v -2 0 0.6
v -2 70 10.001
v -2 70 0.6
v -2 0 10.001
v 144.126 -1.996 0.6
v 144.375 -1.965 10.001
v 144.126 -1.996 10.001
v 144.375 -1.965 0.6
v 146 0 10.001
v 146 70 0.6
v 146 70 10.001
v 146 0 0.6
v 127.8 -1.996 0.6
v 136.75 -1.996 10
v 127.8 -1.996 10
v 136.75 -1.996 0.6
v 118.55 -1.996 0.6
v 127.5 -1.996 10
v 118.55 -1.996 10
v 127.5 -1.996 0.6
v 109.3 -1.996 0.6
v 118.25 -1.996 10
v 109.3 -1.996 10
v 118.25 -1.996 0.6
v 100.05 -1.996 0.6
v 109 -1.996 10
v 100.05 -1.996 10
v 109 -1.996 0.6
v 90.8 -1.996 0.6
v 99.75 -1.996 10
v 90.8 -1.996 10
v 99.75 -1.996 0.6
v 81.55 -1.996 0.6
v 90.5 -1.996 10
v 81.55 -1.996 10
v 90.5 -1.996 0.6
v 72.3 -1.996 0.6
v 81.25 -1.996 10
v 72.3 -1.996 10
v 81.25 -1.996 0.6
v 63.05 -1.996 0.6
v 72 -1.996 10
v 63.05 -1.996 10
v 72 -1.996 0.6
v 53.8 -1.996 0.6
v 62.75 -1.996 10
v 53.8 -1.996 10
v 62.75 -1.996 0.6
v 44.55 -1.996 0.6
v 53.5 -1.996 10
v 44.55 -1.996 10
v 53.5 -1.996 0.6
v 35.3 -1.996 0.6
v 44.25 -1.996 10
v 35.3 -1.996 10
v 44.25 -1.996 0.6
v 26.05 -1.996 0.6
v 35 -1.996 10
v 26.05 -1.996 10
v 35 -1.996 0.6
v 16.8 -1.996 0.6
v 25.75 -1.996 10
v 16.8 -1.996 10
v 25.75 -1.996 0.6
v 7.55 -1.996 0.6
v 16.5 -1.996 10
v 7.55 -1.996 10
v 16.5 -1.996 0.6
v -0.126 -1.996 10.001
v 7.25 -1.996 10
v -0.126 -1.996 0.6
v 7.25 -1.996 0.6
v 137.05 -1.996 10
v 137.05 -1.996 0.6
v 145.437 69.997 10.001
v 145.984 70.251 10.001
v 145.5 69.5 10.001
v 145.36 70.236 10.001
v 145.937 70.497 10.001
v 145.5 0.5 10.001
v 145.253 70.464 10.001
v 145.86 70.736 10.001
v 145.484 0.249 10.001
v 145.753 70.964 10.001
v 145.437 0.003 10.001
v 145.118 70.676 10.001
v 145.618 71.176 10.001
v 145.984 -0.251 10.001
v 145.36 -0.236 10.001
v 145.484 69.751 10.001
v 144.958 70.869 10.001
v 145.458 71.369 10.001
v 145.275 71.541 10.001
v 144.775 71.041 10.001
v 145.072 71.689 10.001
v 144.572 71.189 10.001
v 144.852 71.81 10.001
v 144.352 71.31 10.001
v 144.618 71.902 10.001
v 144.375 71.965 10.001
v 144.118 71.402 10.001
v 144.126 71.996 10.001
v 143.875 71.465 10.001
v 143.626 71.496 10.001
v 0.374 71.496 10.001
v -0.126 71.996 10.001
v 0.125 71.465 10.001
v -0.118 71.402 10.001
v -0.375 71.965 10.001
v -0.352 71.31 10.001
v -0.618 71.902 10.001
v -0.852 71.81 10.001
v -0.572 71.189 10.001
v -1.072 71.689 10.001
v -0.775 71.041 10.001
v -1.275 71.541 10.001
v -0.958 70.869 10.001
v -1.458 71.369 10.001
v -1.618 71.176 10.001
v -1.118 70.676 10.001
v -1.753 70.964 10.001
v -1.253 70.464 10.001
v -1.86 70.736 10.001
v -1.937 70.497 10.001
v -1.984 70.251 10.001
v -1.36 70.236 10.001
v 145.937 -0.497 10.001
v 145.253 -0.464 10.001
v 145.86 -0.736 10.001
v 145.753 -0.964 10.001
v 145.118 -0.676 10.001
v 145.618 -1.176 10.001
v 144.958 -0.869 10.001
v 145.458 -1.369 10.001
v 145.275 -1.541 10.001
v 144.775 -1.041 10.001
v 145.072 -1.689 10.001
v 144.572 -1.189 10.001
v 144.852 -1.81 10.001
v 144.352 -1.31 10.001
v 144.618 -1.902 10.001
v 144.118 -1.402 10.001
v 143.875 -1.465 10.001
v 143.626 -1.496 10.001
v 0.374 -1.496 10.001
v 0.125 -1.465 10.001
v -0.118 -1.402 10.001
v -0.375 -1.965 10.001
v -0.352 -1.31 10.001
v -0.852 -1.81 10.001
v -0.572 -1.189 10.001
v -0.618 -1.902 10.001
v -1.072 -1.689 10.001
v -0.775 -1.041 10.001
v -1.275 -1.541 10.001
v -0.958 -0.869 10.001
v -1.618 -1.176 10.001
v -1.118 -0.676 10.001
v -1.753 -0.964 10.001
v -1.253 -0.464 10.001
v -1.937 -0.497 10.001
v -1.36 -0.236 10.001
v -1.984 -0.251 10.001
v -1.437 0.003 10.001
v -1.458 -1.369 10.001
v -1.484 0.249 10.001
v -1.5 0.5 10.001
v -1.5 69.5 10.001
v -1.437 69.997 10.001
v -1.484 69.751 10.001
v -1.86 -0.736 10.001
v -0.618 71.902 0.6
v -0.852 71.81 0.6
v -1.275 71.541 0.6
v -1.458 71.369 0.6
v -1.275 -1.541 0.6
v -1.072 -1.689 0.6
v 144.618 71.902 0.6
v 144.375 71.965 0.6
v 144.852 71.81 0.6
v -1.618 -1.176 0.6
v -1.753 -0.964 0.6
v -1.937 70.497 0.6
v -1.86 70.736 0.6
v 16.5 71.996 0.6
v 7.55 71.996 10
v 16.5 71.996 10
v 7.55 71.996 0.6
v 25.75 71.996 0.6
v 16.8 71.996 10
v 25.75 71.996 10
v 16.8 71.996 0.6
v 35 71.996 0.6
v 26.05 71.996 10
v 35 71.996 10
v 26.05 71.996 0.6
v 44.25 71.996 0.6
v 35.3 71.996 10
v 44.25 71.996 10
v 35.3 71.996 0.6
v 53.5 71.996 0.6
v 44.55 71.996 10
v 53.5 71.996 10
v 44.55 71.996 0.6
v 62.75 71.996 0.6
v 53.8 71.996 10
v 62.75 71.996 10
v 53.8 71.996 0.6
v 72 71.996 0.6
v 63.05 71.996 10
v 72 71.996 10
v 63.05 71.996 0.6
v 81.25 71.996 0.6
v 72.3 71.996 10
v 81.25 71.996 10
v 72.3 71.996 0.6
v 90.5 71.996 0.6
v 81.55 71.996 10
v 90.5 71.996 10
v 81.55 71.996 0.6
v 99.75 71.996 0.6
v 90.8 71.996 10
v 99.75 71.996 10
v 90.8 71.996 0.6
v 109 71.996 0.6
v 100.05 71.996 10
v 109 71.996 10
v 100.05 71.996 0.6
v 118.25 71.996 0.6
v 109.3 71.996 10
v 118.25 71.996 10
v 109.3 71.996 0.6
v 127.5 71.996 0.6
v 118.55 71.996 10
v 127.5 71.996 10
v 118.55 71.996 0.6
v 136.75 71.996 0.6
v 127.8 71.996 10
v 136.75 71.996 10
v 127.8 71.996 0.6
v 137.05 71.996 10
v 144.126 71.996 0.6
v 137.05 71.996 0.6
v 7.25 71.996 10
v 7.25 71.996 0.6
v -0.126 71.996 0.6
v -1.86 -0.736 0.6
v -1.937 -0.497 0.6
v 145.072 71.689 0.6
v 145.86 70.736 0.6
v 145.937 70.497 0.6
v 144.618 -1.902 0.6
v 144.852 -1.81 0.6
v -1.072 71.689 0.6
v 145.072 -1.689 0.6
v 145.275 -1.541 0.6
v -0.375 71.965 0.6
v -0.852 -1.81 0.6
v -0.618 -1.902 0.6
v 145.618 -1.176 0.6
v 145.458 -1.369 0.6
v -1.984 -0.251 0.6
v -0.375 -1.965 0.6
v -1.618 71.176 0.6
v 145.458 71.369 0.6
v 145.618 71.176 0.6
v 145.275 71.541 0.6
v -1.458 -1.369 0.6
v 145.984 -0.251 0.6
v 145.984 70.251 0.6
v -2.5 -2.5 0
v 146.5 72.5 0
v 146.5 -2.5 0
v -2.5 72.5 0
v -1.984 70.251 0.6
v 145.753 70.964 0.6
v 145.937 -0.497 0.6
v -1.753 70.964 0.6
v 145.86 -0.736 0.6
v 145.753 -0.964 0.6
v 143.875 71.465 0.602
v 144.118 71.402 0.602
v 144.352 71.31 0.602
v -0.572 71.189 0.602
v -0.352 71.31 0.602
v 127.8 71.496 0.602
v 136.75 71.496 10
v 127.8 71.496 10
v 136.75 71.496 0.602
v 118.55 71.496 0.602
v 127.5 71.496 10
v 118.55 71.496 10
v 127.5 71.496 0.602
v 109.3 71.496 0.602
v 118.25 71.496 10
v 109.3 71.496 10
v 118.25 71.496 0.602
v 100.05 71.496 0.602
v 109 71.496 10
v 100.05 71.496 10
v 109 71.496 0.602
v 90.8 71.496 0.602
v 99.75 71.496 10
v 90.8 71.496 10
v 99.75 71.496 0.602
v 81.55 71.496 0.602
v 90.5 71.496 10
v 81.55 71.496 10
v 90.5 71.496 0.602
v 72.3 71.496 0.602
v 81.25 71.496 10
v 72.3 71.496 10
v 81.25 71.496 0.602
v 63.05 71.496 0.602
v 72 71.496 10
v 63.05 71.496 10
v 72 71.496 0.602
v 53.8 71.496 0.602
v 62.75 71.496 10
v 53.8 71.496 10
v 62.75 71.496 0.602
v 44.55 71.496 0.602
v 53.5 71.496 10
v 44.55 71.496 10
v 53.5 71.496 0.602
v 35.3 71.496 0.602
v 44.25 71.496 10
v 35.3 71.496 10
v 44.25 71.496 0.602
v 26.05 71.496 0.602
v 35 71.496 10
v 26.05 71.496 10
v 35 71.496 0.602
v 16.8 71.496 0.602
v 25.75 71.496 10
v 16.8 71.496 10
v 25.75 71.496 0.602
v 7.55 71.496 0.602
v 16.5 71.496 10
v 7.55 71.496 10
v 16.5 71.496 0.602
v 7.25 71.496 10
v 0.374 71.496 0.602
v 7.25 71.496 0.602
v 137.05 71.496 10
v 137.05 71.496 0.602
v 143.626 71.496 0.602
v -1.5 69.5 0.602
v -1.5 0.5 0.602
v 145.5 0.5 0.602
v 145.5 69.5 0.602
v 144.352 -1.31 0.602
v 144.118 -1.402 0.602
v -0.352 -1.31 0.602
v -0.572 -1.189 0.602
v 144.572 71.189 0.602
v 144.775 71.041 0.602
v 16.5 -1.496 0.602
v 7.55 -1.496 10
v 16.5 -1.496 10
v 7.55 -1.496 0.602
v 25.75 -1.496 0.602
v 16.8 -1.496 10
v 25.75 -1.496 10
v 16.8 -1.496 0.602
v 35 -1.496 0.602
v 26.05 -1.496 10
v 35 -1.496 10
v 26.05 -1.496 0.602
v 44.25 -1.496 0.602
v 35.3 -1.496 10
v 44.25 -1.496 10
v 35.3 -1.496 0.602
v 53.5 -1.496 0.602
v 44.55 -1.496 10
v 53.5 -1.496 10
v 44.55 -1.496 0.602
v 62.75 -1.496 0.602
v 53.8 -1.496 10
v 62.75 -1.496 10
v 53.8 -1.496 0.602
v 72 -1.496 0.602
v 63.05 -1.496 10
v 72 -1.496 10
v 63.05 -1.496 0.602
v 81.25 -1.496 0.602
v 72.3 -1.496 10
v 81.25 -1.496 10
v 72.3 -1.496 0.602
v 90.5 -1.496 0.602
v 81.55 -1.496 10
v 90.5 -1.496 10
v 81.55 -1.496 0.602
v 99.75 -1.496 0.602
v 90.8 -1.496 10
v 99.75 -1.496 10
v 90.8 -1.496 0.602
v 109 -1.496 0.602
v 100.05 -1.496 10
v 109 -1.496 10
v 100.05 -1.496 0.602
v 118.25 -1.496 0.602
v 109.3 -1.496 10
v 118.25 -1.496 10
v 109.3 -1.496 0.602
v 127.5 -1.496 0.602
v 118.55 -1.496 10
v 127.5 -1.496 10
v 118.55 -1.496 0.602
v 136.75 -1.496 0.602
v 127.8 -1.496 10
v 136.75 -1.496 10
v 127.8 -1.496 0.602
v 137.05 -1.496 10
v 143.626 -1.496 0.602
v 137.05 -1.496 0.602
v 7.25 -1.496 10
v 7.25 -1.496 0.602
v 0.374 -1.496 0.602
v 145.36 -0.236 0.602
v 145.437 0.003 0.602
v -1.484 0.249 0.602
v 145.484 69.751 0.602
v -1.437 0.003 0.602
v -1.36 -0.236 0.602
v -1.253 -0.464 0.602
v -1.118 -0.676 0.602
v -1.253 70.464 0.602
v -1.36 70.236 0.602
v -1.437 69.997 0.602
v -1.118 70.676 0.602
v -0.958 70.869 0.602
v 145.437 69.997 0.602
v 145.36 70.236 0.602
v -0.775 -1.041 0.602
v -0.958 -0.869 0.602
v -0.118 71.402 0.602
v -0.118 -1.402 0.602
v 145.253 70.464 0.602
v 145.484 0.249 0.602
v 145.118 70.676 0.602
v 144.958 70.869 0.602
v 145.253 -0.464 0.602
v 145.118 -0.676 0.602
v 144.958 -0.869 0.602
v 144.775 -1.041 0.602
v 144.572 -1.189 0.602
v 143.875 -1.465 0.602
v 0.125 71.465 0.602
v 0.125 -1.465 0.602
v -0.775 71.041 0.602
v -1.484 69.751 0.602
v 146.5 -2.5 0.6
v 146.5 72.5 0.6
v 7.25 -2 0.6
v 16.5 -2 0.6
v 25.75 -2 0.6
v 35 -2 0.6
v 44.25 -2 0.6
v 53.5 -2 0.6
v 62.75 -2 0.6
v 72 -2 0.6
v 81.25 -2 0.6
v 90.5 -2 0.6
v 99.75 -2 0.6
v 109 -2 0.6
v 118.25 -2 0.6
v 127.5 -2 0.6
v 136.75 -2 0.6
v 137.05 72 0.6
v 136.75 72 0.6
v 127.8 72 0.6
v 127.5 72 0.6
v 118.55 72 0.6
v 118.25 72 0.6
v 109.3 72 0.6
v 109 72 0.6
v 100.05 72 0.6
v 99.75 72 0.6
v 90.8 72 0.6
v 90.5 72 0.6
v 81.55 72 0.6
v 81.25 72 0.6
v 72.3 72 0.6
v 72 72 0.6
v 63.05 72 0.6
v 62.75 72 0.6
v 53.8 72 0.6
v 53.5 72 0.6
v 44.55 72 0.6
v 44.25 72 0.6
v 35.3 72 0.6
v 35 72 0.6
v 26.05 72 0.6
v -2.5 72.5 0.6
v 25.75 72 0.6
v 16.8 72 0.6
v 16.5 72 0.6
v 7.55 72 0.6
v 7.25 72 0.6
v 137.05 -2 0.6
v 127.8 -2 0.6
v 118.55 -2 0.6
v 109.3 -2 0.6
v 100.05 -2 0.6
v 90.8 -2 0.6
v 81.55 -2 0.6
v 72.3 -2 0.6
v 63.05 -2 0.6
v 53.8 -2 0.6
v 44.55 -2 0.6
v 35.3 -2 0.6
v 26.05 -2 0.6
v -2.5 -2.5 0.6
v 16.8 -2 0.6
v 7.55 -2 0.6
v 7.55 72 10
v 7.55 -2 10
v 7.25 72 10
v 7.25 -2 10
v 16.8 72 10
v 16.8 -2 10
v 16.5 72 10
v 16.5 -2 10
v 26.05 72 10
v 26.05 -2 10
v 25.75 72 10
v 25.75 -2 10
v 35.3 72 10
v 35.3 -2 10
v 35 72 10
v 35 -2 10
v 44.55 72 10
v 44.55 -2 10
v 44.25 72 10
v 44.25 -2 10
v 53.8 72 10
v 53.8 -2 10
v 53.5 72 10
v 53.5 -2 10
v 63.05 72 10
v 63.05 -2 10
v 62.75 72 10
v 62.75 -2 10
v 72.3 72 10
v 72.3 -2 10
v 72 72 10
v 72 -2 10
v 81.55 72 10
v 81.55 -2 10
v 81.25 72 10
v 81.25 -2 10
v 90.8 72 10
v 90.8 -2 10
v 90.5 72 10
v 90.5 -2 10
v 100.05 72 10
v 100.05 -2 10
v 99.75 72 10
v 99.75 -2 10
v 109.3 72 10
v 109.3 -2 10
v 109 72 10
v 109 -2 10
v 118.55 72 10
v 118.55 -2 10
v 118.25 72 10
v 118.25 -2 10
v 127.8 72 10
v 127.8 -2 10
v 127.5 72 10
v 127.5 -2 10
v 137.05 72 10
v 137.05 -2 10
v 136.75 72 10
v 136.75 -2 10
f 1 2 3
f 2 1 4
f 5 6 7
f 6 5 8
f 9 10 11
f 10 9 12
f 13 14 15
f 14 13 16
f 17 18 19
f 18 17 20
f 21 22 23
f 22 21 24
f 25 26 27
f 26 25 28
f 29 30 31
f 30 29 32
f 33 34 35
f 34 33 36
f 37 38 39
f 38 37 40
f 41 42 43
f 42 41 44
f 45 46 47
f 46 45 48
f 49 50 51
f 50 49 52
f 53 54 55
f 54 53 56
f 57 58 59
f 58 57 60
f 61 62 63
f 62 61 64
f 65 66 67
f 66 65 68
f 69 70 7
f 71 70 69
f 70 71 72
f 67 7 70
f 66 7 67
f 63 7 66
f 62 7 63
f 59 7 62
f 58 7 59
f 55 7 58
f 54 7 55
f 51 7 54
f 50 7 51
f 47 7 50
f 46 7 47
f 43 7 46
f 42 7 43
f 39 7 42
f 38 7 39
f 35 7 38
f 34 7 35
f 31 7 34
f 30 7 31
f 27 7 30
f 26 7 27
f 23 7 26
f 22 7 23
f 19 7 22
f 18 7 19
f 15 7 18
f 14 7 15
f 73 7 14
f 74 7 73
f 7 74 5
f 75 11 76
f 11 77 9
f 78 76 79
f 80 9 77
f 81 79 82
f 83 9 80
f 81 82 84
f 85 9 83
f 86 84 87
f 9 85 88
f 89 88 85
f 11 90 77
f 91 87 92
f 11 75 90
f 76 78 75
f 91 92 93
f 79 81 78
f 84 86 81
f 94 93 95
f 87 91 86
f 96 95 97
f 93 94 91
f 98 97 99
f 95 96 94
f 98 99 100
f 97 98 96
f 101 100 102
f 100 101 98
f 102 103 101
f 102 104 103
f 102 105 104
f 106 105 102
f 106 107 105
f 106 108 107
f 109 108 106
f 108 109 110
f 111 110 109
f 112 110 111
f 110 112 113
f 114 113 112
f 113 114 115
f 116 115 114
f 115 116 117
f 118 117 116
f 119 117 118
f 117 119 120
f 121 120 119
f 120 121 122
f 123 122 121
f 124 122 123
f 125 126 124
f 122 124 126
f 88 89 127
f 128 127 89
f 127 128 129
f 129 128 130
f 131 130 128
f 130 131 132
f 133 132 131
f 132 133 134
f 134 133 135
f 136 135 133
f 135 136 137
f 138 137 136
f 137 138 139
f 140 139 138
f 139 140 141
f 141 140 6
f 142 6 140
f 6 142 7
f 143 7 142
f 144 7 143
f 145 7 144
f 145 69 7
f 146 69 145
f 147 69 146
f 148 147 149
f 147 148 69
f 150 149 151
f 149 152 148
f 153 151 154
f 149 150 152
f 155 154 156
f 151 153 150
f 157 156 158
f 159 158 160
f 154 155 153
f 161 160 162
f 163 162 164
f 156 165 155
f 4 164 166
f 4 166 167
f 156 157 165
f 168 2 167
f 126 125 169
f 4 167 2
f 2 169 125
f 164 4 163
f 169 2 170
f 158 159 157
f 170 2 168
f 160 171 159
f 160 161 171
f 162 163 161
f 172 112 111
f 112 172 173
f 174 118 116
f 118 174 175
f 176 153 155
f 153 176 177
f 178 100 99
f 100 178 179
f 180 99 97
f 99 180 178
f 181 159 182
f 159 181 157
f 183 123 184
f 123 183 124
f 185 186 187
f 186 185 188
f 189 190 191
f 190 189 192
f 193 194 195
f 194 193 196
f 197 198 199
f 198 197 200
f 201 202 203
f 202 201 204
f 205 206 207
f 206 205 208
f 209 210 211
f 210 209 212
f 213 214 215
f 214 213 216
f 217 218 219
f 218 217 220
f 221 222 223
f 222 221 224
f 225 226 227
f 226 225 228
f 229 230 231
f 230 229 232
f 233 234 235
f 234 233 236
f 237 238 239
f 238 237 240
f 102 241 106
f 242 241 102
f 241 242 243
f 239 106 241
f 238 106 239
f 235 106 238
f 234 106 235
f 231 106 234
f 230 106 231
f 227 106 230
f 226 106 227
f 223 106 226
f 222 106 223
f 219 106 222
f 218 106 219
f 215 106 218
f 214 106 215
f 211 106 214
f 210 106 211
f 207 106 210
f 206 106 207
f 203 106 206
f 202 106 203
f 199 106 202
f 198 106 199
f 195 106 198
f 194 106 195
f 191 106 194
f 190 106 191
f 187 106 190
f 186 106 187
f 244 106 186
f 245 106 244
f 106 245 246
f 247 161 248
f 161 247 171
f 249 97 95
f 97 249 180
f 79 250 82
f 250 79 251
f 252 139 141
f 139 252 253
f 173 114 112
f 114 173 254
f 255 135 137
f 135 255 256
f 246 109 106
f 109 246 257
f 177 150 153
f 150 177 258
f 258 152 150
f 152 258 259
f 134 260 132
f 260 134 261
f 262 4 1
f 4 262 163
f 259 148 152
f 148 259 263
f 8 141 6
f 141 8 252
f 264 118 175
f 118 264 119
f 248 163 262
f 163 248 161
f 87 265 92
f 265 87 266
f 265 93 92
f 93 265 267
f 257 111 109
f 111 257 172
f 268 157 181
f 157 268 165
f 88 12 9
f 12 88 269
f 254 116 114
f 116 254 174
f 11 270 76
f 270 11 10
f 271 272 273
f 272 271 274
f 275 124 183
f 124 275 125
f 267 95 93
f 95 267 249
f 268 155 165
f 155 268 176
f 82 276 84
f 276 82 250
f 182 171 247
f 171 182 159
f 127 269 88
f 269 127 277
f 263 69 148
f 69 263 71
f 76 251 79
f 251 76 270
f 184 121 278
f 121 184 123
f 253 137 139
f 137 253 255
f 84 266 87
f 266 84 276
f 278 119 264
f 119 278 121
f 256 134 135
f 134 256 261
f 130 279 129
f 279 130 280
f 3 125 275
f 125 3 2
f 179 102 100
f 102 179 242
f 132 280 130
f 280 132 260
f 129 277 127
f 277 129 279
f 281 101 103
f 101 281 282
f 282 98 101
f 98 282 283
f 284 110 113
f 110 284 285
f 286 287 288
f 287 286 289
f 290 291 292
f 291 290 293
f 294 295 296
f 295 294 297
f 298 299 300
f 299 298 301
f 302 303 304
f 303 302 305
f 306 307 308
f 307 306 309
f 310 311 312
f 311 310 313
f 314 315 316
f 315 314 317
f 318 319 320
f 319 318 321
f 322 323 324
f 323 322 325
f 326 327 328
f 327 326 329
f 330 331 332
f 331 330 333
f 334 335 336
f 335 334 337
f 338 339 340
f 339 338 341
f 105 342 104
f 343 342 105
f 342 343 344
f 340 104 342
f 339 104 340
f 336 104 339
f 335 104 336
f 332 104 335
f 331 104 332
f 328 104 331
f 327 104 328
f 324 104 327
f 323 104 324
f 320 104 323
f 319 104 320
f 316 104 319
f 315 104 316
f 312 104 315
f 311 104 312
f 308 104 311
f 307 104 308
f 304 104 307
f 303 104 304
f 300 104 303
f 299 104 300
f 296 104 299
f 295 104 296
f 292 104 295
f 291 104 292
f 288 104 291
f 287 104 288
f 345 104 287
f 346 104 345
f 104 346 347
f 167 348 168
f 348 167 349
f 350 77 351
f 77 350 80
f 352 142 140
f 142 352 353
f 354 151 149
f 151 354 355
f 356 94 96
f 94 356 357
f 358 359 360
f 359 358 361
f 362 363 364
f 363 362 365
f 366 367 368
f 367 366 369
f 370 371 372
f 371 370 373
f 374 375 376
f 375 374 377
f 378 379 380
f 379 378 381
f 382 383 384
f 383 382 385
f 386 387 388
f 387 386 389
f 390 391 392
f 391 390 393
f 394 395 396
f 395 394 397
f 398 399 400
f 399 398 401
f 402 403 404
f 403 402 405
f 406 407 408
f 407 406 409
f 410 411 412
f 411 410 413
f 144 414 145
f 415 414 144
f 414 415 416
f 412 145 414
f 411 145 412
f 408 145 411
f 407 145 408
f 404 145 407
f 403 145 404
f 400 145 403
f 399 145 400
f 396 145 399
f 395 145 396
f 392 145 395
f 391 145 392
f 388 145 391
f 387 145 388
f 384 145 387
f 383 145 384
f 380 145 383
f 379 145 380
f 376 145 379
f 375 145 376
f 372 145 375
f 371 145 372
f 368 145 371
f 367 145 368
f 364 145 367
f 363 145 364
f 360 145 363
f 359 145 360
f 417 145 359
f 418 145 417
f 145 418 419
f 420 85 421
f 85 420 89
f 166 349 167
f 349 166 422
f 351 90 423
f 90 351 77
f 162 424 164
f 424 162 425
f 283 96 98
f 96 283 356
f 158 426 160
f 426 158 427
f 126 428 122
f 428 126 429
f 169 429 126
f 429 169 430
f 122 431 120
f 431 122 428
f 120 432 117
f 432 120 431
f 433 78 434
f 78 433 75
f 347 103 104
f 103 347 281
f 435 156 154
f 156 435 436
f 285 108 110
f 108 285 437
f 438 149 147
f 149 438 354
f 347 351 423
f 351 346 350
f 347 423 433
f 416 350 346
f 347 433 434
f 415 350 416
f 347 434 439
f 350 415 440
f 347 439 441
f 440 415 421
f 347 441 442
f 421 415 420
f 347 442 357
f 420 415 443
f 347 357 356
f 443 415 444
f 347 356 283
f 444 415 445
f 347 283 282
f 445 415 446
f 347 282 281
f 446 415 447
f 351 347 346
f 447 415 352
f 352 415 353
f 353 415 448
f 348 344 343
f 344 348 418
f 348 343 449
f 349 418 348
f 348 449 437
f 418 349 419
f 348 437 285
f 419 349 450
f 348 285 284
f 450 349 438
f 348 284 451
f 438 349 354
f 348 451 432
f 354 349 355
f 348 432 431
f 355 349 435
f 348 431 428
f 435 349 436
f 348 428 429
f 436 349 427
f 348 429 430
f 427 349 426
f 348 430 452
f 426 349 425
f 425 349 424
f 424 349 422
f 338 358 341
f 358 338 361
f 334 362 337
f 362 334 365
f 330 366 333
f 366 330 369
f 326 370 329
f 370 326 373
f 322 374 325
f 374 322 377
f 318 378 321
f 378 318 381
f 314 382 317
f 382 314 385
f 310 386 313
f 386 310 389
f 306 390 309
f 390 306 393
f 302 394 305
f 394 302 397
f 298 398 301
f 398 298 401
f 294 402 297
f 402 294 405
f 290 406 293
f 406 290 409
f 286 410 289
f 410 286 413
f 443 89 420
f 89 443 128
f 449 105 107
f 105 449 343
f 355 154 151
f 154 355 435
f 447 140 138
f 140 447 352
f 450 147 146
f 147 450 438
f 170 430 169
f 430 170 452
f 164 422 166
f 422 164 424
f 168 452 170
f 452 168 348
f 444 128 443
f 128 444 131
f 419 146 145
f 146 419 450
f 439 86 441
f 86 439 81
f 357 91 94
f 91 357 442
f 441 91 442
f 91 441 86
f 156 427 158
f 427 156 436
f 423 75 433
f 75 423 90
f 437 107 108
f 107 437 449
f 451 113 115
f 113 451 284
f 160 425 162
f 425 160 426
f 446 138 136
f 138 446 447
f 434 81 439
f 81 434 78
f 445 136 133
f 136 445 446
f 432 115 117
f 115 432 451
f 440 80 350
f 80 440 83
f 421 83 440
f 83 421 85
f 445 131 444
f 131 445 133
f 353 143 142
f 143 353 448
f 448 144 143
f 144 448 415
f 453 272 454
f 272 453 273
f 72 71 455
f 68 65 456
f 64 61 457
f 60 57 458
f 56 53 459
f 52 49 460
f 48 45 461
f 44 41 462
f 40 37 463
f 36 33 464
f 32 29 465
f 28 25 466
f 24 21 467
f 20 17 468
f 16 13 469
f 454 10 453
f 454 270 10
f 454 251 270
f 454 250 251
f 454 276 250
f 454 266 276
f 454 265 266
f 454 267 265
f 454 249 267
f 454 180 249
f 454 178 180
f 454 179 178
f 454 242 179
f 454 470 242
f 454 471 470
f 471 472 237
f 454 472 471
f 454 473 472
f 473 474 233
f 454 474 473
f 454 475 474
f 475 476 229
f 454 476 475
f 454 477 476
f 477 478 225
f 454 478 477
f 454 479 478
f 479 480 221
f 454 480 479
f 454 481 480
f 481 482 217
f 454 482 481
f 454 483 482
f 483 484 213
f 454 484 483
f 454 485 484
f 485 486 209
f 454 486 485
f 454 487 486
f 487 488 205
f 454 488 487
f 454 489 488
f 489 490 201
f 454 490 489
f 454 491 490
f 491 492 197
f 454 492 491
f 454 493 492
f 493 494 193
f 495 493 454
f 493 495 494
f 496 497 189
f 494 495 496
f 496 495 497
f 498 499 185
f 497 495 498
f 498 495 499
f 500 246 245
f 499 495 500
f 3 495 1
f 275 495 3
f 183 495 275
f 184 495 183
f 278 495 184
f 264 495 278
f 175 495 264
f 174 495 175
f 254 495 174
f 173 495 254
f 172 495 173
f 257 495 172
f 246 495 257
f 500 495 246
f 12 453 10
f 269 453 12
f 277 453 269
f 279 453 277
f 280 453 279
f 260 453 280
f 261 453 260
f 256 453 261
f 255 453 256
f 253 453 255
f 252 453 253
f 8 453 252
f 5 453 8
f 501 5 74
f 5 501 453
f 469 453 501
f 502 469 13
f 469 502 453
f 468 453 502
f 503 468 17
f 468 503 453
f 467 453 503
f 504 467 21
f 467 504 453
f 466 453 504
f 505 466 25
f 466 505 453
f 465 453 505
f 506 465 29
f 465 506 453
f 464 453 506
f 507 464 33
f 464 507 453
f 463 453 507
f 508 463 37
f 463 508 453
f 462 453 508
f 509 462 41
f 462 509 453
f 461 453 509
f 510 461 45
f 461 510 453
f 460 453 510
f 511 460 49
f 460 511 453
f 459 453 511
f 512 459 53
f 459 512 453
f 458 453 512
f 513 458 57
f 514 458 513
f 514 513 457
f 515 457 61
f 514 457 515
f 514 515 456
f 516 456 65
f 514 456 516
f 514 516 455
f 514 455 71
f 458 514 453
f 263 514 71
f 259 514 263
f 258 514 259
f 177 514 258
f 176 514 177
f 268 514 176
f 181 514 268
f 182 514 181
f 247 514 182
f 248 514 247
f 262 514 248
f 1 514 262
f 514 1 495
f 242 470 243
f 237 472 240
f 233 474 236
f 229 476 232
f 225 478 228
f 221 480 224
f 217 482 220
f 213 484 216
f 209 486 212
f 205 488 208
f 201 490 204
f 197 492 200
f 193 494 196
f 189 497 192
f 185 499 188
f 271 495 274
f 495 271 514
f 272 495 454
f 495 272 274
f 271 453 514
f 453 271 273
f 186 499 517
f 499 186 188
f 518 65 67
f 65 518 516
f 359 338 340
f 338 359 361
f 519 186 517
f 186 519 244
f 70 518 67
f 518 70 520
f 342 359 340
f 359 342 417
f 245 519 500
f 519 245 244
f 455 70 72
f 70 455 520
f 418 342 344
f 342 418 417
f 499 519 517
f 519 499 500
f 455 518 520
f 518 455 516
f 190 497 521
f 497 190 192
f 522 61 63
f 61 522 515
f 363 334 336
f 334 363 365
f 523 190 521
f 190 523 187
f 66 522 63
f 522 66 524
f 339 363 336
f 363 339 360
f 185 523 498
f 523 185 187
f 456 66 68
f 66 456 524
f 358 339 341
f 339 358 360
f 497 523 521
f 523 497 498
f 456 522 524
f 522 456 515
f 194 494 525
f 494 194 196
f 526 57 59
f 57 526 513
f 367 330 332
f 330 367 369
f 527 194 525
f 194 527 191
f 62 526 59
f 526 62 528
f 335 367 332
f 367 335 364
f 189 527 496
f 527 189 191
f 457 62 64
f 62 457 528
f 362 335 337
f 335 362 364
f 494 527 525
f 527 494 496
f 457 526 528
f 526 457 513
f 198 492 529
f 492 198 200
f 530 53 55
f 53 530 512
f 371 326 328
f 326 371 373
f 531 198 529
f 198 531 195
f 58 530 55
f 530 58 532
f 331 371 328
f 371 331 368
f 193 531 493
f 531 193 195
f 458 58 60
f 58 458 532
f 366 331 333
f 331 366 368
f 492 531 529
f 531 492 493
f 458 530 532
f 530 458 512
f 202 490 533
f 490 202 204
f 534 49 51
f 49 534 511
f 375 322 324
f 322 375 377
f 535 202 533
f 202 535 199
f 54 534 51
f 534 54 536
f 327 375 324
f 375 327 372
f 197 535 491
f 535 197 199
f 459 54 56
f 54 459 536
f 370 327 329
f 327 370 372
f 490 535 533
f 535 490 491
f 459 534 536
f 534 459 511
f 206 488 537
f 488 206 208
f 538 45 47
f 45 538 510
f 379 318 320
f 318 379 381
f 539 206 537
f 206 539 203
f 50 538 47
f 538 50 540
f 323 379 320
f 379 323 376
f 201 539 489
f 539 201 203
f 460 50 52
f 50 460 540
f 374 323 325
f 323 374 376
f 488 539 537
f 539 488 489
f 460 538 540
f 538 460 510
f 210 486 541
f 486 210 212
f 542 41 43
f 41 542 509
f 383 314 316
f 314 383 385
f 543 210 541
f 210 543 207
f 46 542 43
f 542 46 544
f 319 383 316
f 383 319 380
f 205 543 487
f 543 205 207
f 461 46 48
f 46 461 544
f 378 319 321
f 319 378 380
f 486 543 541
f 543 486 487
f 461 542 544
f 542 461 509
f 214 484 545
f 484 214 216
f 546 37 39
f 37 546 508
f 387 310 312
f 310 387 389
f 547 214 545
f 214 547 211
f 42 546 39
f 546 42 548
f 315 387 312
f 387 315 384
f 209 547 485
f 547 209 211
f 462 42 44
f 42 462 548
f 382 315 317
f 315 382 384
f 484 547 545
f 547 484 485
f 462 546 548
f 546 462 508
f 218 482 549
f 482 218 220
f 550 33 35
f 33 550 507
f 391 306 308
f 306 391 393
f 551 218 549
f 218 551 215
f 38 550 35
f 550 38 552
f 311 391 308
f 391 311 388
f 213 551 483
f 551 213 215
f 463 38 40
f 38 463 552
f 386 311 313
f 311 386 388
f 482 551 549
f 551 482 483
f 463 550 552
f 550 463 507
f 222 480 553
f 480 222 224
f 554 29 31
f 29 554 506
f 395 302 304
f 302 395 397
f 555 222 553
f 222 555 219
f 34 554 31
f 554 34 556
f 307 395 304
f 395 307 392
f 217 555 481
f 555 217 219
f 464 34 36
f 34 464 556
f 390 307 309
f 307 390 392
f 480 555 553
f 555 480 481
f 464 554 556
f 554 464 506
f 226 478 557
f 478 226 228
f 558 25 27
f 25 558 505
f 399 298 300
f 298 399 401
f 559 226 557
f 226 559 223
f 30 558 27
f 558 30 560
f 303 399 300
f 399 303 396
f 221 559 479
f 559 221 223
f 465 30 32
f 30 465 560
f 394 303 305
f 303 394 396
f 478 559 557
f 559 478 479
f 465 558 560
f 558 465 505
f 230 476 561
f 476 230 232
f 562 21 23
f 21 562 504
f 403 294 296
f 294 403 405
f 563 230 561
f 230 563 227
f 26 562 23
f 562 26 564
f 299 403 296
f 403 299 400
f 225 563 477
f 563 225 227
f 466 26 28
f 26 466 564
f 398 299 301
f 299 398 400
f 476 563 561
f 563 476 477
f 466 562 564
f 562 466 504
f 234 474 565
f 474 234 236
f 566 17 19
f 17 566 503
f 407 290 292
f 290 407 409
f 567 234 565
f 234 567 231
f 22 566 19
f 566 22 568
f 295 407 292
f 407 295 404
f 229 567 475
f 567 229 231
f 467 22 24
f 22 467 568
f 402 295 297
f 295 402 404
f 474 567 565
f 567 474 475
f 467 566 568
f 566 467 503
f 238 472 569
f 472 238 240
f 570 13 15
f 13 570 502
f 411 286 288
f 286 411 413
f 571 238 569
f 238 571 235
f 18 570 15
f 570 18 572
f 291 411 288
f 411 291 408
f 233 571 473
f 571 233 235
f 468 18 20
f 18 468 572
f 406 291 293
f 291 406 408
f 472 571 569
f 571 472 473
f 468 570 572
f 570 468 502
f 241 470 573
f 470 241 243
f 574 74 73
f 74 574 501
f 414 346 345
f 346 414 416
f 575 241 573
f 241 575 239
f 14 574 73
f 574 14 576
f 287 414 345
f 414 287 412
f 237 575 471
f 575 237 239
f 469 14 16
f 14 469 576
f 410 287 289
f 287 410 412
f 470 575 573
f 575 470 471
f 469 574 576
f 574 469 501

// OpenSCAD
makelid=false;
makebox=true;

$fn=50;
kw=8;
wmul=16;
l=70; //length
h=10; //height
wt=1;//wall thickness
iwt=0.6;//0.8 before and .4 before that;//inner wall thickness
cr=2; //  corner radius
lidth=0.6; //lid thickness
extracr=0.5;//extra for bottom lip
tw=wmul*(kw+wt);
bt=0.6; //bottom thicksness

ocr=cr+1;
otw=tw+ocr/2;
ol=l+ocr/2;

if(makebox) thebox();
if(makelid) thelid();

module thebox(){
    union(){
        roundbox(tw,l,h,bt=bt);
        septices(kw+wt+cr/8,l,h,0.6,wmul);
    }
}

module thelid(){
    color("green")translate([-ocr/4,-ocr/4,10]) lid(otw,ol,h*0.4,lidth);
}





module roundbox(w,l,h,bt){
  
    union(){
        //#cube([w,l,h]);
        difference(){
            minkowski(){
                cube([w,l,h]);
                cylinder(r=cr,h=0.001);
            }
            translate([wt/2,wt/2,bt+0.002])
            minkowski(){
                cube([w-wt,l-wt,h-bt]);
                cylinder(r=cr,h=0.001);
            }
        }
        translate([-(cr+extracr),-(cr+extracr),0])
            cube([w+(cr+extracr)*2,l+(cr+extracr)*2,bt]);
    }
}

module septices(kw,l,h,bt,wmul){   
    for (i = [1:wmul-1]) {       
        translate([i*kw-cr,-cr,bt])
            cube([iwt/2,l+cr*2,h-bt]);
    }
}

module lid(w,l,h,lidth){
  difference(){
        minkowski(){
            cube([w,l,h]);
            cylinder(r=cr,h=0.001);
        }
        translate([wt/2,wt/2,-lidth-0.002])
            minkowski(){
                cube([w-wt,l-wt,h-lidth]);
                cylinder(r=cr,h=0.001);
            }
    }
}
